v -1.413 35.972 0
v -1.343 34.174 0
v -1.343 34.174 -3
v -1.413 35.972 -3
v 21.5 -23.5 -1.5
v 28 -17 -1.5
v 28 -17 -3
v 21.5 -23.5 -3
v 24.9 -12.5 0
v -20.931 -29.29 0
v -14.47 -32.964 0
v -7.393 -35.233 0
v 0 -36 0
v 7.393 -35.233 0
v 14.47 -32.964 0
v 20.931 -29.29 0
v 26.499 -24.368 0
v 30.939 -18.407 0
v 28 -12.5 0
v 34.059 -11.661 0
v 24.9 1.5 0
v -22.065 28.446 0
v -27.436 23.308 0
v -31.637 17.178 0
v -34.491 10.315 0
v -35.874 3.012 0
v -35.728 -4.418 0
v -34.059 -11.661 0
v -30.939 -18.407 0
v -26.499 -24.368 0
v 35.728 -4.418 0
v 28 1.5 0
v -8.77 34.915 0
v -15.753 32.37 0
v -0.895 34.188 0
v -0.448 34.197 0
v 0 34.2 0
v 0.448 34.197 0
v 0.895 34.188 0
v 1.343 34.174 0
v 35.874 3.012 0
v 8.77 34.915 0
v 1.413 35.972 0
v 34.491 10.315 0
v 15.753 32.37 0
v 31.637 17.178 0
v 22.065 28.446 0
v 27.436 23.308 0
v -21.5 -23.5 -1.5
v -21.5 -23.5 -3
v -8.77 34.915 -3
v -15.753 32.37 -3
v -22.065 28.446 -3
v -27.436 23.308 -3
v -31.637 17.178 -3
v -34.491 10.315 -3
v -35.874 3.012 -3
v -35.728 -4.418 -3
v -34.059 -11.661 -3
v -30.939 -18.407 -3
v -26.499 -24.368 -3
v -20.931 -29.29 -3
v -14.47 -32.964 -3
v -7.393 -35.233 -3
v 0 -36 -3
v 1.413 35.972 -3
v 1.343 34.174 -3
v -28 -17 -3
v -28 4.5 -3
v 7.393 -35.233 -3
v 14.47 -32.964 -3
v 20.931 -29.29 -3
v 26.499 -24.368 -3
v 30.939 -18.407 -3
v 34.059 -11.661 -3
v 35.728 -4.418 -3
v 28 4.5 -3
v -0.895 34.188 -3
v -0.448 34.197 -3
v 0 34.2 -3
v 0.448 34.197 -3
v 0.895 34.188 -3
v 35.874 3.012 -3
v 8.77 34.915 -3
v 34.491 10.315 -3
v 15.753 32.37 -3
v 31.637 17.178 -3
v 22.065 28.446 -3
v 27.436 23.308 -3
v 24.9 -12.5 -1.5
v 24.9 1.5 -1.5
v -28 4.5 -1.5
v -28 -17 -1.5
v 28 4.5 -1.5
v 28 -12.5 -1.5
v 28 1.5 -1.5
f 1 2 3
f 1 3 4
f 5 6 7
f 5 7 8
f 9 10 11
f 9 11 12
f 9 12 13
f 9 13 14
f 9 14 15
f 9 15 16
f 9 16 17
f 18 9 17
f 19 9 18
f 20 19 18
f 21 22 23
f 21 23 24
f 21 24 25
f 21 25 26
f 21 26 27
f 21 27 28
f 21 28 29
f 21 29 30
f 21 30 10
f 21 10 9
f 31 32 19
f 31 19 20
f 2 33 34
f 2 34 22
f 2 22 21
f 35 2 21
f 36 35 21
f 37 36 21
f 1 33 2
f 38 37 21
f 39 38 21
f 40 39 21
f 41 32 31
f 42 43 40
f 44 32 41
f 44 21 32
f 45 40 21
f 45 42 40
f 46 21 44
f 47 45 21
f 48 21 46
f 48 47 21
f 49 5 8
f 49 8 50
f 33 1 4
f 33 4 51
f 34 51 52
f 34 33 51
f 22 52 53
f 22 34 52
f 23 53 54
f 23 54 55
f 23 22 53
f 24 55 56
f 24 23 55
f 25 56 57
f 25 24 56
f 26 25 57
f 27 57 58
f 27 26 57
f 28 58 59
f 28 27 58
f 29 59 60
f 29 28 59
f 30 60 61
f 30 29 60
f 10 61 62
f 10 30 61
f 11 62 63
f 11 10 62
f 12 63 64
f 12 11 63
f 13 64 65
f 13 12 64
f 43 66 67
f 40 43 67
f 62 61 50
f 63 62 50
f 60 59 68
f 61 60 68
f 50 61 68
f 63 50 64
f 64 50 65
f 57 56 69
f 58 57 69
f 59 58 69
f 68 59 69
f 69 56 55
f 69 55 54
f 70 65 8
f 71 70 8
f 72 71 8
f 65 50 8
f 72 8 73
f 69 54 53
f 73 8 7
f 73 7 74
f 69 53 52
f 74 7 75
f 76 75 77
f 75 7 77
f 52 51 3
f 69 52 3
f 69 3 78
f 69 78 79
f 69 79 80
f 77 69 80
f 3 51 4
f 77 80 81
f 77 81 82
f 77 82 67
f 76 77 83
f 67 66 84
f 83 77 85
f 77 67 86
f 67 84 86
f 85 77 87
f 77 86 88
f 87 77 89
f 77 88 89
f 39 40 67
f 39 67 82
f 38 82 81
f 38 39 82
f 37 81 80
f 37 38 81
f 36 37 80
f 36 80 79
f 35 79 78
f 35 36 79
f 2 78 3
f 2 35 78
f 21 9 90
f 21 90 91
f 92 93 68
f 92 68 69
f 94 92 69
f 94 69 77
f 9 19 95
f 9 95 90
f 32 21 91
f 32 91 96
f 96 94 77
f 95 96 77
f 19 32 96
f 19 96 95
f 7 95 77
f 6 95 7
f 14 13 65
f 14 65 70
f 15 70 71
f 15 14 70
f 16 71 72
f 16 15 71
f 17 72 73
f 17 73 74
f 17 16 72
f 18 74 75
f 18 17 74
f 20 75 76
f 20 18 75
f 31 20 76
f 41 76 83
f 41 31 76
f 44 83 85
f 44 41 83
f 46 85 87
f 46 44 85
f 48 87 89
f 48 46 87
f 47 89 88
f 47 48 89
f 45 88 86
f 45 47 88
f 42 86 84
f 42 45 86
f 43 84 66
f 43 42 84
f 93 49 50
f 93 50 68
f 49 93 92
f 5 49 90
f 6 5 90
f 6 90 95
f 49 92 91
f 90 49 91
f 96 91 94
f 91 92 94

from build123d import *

# Parameters (mm, degrees)
BOSS_EXTRUDE3_DEPTH = 3
BOSS_EXTRUDE4_DEPTH = 1.5


with BuildPart() as part:
    # Sketch1 → Boss-Extrude3 (new body)
    with BuildSketch(Plane.XY):
        with BuildLine():
            ThreePointArc((1.342685699, 34.173633039), (0, 34.2), (-1.342685699, 34.173633039))
            Line((-1.342685699, 34.173633039), (-1.413353367, 35.972245305))
            ThreePointArc((-1.413353367, 35.972245305), (0, -36), (1.413353367, 35.972245305))
            Line((1.413353367, 35.972245305), (1.342685699, 34.173633039))
        make_face()
        Polygon((21.5, -23.5), (-21.5, -23.5), (-28, -17), (-28, 4.5), (28, 4.5), (28, -17), align=None, mode=Mode.SUBTRACT)
    extrude(amount=-BOSS_EXTRUDE3_DEPTH)

    # Sketch1<9> → Boss-Extrude4 (add)
    with BuildSketch(Plane.XY):
        Polygon((28, 4.5), (-28, 4.5), (-28, -17), (-21.5, -23.5), (21.5, -23.5), (28, -17), (28, -12.5), (24.9, -12.5), (24.9, 1.5), (28, 1.5), align=None)
    extrude(amount=-BOSS_EXTRUDE4_DEPTH)


solid = part.part
